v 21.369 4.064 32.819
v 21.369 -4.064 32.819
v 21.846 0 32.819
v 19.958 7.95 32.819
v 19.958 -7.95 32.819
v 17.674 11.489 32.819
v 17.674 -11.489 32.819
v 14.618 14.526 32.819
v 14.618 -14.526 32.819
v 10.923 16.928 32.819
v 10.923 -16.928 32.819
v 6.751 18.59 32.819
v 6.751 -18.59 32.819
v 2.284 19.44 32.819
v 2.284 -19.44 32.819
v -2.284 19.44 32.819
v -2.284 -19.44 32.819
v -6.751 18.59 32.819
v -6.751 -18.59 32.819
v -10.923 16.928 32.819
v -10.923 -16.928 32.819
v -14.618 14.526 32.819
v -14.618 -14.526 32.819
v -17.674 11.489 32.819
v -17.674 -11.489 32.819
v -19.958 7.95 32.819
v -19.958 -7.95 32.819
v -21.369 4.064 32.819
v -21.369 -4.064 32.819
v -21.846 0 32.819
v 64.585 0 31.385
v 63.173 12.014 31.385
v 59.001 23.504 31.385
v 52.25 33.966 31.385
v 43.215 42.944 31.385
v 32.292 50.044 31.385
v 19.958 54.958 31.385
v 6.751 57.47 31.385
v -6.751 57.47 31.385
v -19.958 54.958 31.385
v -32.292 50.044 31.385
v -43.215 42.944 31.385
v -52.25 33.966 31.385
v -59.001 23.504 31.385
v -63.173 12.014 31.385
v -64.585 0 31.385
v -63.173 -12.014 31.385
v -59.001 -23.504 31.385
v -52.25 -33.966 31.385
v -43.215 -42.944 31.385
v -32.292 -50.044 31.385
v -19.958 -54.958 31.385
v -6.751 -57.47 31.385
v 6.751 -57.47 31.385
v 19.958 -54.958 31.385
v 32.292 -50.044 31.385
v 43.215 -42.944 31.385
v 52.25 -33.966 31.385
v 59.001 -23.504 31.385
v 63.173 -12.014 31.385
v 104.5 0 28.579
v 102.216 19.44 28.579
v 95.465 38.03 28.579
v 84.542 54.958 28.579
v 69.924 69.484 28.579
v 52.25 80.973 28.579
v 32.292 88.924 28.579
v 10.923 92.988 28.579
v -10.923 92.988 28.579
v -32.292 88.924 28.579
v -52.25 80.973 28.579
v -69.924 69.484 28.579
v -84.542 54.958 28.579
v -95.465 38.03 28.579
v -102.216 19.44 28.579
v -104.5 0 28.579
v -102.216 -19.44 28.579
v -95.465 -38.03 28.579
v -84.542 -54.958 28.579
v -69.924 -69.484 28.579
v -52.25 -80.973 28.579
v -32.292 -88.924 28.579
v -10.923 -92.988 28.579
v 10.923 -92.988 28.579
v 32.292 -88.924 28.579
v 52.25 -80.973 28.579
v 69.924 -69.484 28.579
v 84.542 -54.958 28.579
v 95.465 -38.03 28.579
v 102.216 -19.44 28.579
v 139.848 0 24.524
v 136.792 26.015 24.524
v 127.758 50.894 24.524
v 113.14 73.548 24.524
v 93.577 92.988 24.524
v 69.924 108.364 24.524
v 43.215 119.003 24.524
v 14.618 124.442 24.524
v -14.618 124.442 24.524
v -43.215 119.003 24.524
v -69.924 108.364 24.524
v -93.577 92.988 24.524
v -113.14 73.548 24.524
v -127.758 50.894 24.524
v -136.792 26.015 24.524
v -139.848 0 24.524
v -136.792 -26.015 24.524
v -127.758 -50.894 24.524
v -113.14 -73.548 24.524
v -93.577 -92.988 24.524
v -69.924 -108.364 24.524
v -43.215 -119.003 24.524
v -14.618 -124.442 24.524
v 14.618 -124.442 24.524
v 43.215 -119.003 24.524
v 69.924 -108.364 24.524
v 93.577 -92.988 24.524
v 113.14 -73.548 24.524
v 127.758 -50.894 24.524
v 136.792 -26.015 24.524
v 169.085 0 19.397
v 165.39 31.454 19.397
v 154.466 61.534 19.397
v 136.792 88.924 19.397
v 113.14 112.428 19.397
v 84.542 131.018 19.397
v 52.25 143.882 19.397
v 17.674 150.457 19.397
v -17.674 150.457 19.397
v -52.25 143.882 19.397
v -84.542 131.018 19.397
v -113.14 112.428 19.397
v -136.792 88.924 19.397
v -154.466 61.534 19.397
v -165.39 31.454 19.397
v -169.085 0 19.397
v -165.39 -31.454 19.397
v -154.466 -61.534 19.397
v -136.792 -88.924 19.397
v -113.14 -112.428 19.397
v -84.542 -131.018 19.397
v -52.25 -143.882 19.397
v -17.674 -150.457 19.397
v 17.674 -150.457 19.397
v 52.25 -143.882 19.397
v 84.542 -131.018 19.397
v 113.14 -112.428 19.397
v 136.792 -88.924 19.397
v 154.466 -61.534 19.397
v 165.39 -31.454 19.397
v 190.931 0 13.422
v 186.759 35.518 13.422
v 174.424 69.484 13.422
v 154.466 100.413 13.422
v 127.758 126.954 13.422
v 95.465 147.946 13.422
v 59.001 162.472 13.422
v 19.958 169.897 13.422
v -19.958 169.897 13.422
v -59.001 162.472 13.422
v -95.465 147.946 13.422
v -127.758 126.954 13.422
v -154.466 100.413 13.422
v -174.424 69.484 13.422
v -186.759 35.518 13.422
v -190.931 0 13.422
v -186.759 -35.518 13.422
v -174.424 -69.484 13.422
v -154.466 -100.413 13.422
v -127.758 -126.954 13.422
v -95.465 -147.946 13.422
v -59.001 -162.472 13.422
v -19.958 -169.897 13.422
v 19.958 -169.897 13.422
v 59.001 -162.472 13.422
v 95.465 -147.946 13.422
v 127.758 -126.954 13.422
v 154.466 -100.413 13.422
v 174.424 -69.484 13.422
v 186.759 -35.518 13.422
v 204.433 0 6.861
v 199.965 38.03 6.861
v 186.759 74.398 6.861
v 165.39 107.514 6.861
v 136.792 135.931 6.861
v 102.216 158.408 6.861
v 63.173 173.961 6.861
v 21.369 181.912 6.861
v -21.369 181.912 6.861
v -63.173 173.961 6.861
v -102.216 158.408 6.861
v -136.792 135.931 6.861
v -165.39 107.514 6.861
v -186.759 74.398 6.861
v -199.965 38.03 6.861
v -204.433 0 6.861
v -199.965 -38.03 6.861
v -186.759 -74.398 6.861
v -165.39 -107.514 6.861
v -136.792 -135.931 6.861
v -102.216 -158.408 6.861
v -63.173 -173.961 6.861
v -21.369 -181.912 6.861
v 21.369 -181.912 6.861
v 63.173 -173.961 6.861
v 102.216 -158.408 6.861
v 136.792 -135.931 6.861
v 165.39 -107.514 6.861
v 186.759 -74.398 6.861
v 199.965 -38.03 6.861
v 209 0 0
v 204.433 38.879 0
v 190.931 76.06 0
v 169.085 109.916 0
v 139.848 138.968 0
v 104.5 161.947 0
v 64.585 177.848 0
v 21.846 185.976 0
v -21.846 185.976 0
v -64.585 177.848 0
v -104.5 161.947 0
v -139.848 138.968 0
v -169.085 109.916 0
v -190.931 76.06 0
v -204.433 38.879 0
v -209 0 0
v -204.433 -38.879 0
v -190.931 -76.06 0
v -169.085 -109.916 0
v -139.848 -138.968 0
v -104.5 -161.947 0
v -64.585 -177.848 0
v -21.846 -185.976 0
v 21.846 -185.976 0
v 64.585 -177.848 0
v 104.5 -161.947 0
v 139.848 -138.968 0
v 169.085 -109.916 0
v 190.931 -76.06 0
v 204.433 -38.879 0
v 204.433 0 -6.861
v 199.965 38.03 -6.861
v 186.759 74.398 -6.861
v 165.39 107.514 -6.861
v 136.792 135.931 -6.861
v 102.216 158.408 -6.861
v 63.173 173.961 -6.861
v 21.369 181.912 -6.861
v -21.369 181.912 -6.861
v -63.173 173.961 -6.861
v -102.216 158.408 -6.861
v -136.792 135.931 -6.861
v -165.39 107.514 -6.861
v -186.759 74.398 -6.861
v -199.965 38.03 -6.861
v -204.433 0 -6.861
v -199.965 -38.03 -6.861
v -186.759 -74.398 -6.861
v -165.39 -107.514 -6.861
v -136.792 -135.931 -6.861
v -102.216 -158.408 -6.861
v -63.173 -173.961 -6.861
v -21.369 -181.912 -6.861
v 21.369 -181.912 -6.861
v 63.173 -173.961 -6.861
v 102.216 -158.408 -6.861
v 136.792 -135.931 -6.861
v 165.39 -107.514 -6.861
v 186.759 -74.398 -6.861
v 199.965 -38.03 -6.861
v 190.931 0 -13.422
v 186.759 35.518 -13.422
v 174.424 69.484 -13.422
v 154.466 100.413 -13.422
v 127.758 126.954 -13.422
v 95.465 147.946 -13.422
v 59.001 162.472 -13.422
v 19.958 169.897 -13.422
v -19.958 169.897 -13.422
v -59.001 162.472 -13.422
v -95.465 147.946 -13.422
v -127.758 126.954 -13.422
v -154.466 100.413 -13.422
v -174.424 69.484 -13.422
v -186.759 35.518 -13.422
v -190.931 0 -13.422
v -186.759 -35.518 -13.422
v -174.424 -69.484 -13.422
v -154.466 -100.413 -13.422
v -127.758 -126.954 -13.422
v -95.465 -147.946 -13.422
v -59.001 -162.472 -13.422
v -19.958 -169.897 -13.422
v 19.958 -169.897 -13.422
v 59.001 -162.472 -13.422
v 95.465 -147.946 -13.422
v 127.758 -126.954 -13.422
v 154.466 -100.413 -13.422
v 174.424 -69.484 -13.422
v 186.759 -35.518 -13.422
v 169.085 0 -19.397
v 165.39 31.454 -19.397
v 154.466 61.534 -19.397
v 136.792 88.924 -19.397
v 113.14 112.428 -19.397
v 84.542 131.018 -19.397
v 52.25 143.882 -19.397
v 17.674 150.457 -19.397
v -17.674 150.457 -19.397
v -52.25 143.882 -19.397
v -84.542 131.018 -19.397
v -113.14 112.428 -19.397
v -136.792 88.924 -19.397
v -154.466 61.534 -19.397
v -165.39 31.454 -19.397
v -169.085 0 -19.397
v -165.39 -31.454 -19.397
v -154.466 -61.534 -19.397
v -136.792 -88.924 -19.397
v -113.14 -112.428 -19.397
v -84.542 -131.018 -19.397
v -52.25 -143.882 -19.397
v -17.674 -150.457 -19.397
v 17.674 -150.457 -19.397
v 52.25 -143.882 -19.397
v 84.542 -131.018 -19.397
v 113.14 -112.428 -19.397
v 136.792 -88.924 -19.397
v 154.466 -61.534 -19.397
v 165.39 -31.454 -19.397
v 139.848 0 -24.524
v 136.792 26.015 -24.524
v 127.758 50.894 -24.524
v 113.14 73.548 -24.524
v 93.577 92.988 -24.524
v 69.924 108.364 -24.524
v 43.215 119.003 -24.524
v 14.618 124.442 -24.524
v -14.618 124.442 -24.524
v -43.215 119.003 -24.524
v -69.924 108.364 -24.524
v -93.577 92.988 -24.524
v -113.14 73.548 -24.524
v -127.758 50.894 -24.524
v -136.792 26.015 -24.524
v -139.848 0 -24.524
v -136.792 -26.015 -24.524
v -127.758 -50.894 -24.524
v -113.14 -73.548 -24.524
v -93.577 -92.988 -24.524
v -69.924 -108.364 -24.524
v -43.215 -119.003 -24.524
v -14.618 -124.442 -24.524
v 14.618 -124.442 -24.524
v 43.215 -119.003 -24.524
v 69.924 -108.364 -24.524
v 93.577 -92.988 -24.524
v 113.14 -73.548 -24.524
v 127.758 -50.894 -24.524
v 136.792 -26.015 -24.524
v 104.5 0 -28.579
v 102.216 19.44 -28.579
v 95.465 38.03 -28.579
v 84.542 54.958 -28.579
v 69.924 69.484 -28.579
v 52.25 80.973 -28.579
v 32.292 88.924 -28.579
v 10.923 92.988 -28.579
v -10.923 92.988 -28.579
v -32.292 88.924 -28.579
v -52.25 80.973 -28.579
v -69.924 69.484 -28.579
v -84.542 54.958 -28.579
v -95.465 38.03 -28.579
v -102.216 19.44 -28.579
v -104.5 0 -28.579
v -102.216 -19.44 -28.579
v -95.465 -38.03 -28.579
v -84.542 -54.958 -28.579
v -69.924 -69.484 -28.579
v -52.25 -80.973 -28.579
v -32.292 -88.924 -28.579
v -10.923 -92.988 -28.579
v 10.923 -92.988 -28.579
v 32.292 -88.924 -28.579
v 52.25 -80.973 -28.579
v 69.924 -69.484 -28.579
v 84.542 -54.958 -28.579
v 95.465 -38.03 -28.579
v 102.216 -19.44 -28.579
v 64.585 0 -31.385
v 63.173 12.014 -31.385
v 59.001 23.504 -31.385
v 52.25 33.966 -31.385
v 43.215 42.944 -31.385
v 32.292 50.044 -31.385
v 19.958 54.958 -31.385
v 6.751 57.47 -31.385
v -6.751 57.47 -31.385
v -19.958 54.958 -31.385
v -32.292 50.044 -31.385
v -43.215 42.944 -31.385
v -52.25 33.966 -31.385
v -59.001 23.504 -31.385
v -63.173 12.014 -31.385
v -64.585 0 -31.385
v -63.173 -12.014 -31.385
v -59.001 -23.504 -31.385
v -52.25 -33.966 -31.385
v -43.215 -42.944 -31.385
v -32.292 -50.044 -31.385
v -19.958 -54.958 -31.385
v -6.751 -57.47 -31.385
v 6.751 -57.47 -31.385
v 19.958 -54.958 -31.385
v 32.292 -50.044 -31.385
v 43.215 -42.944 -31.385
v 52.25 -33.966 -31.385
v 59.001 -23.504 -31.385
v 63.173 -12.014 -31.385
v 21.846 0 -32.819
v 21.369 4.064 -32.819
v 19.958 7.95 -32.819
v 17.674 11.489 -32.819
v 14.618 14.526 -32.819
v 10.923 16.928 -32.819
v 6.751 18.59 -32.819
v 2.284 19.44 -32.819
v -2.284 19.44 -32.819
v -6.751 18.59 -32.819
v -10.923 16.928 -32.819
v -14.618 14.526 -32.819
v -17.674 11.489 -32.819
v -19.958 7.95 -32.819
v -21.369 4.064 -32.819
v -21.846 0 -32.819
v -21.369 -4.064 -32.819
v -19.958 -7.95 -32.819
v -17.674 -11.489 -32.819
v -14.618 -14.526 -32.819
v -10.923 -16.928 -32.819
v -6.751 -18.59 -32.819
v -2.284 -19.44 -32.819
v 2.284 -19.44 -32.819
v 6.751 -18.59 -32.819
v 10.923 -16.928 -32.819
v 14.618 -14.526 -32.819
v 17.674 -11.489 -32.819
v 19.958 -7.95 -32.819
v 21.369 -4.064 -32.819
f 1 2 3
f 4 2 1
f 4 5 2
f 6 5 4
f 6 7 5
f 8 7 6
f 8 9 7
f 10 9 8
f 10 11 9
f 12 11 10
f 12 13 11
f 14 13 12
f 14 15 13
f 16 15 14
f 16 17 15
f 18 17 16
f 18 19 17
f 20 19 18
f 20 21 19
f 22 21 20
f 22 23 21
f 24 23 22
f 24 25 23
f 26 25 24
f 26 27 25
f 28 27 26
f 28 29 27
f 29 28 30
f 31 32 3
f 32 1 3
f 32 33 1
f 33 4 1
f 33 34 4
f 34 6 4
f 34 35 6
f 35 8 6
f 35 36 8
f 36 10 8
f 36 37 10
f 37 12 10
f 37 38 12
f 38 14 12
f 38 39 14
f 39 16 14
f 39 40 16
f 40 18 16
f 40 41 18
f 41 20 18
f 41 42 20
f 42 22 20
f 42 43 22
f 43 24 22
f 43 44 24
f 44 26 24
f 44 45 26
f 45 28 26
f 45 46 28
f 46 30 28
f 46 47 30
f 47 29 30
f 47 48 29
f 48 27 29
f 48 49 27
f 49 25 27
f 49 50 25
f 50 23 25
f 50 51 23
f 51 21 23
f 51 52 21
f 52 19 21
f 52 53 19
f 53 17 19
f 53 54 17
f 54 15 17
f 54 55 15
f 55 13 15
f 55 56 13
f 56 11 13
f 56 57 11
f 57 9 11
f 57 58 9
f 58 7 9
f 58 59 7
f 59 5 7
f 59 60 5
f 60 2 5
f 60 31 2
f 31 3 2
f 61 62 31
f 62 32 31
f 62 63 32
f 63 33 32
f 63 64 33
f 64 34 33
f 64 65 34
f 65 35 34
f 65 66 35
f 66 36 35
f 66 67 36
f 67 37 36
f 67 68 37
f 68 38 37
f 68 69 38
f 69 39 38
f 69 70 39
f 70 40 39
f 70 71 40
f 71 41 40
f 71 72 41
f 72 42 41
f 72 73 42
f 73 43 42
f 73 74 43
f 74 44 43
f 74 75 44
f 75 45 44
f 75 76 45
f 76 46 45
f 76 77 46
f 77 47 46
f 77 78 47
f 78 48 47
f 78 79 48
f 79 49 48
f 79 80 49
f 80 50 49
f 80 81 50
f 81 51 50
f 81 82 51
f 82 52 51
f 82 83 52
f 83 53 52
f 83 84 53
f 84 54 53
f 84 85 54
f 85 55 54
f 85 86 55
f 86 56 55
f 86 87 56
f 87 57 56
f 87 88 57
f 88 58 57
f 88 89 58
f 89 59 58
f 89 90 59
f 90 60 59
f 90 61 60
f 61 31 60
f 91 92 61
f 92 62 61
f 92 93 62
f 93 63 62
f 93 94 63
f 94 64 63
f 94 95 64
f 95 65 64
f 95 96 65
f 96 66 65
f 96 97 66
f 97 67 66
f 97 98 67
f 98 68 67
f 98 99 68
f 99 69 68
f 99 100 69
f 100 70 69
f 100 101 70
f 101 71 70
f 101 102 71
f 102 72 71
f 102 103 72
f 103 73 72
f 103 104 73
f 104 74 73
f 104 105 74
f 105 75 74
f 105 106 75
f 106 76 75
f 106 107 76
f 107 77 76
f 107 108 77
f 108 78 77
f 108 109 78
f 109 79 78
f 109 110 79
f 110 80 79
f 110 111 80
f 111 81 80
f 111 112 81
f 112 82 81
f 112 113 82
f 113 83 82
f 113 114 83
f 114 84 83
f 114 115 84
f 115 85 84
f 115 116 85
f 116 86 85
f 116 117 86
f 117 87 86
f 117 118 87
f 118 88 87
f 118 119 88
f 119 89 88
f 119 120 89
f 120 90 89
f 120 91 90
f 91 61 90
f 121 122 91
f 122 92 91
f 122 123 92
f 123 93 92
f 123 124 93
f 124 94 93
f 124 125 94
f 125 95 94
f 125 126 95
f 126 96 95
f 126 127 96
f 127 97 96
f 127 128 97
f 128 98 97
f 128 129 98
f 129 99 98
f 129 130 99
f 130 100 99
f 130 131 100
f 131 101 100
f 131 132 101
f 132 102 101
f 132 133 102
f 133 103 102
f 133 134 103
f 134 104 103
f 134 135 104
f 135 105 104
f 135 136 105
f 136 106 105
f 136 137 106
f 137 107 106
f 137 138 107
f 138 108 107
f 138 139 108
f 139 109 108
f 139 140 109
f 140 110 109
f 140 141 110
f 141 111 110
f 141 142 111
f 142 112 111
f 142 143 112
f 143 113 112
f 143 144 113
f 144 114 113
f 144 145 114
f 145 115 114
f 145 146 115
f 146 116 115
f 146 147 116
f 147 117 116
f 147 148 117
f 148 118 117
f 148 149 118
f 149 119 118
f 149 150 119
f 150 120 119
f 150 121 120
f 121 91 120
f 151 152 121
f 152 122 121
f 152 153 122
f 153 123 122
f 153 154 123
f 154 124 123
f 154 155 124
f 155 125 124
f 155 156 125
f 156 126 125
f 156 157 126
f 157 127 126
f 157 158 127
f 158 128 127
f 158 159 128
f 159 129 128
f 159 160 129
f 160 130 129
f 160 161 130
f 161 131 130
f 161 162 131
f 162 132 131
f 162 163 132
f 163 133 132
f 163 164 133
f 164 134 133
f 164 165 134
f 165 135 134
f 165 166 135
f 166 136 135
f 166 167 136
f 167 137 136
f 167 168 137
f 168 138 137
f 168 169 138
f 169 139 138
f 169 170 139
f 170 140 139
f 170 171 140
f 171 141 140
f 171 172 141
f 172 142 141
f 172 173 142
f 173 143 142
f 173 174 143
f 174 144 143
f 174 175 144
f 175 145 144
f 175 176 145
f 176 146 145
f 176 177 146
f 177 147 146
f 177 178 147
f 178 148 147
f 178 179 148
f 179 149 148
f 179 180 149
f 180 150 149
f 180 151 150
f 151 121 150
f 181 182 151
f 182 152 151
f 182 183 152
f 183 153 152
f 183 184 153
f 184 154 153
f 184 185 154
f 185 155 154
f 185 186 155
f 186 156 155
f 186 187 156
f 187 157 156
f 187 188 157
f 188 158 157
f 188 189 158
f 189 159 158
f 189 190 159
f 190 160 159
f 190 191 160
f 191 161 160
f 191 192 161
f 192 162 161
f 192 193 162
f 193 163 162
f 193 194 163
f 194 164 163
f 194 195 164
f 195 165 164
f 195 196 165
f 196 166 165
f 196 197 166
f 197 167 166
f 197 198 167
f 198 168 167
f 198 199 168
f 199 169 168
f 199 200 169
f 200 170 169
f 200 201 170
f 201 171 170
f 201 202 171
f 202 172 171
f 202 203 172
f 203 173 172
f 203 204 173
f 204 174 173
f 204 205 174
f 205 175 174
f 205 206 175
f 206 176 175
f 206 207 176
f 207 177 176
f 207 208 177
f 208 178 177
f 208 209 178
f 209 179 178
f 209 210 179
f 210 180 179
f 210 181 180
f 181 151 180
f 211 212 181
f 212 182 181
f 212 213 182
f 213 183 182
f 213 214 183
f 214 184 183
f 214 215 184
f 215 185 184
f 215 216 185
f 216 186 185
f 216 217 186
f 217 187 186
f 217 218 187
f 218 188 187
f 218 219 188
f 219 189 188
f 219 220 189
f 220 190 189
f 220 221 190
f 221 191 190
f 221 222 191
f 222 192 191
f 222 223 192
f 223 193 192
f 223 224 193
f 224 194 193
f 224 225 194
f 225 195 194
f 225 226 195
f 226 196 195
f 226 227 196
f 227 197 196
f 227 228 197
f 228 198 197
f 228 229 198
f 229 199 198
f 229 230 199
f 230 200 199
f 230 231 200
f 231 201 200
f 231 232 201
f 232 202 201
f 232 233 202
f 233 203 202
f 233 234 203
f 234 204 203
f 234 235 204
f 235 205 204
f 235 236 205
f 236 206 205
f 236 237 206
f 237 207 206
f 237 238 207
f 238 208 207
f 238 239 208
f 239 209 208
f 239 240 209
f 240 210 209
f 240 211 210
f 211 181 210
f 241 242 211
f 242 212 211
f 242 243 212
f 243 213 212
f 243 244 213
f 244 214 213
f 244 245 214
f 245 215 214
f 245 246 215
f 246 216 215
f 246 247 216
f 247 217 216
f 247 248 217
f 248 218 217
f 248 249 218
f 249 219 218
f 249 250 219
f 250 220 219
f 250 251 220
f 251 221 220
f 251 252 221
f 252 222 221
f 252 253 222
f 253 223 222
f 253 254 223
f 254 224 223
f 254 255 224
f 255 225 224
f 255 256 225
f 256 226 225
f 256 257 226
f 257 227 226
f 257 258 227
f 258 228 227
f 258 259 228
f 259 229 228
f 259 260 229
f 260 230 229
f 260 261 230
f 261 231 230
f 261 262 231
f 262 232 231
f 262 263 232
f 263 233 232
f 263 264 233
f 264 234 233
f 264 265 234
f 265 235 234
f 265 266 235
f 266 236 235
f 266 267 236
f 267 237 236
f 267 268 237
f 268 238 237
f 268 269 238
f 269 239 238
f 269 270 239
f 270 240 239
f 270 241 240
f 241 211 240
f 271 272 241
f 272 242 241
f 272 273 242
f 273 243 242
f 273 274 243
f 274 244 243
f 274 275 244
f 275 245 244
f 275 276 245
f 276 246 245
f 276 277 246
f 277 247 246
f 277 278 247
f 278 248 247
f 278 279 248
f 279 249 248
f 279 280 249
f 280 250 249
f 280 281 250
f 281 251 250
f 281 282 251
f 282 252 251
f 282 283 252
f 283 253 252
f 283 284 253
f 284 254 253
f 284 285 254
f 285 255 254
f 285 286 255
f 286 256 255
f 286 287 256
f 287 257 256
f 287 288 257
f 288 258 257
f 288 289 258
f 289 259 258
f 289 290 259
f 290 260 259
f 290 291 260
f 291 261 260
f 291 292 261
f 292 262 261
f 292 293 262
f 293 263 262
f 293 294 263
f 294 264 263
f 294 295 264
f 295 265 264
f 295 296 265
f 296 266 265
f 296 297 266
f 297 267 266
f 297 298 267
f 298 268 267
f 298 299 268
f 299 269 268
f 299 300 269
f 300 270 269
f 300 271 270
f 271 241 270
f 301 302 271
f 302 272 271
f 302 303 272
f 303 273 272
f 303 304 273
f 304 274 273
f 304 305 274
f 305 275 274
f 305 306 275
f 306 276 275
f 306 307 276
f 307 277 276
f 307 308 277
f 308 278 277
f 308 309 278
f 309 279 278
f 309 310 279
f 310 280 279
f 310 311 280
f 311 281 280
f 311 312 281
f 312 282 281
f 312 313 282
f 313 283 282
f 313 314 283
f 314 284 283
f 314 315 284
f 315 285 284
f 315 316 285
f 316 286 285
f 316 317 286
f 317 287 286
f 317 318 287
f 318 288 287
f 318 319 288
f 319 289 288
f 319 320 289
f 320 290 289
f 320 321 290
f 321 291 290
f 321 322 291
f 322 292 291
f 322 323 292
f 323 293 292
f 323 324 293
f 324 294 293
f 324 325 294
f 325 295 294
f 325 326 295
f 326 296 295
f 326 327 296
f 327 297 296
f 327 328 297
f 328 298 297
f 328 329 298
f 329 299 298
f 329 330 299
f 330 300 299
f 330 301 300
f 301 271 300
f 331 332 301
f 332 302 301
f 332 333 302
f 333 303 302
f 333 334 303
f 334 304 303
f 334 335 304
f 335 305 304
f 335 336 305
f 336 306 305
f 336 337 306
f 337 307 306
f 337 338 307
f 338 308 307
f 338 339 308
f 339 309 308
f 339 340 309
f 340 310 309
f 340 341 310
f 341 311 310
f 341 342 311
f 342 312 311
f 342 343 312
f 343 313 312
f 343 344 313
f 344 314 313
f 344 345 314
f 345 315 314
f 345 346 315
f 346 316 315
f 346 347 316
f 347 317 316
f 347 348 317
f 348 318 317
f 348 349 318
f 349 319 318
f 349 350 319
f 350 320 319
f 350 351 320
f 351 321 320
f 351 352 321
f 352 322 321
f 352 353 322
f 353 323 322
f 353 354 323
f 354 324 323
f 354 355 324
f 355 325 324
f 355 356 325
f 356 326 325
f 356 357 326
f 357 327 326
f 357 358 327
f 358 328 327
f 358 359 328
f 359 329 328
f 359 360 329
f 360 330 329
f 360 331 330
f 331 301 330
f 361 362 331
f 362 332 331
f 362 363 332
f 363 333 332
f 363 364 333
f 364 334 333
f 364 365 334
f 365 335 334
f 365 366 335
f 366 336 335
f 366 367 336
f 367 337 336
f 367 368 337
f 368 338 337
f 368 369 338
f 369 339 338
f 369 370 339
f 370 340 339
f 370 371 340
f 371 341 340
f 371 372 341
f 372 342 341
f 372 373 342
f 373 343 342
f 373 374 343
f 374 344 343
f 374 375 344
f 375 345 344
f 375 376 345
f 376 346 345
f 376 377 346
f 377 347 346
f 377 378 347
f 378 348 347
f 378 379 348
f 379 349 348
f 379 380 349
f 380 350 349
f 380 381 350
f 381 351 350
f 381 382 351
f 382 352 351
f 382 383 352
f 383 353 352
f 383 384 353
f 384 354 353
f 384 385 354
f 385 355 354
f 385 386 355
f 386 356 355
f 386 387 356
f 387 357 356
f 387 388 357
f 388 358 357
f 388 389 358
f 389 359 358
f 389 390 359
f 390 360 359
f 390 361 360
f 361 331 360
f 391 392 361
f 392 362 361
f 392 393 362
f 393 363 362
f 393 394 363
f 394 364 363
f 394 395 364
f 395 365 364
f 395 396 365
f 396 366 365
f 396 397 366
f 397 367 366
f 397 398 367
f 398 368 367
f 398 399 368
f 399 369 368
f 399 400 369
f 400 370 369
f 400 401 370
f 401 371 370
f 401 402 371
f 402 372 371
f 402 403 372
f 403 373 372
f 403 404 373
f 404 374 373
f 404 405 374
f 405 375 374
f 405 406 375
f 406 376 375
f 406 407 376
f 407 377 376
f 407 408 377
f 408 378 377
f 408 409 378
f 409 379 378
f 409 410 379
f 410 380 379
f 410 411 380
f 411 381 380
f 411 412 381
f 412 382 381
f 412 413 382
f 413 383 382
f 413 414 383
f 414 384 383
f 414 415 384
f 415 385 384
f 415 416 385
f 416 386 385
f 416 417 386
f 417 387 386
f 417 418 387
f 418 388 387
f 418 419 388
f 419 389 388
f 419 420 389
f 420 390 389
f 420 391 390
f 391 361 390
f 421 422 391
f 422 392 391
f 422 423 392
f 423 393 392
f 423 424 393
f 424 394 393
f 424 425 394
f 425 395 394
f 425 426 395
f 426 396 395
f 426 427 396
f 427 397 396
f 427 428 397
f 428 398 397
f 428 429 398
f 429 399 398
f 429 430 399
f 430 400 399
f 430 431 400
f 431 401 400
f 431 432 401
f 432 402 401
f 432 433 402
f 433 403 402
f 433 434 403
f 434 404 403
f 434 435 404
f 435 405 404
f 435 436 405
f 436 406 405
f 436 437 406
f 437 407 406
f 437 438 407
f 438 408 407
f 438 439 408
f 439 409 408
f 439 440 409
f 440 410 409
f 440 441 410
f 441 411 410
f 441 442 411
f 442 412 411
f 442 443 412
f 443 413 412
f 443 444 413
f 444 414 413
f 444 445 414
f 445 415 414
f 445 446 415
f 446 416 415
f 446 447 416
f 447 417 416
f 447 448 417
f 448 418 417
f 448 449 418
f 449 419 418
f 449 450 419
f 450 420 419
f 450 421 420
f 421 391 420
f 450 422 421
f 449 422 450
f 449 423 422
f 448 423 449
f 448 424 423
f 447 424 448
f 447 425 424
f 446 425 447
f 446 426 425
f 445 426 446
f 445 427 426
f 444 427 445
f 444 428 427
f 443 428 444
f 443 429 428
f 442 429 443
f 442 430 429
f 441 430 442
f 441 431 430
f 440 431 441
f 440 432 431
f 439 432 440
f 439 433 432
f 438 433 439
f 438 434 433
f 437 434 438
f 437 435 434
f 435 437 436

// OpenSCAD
// Generated by SolidPython 1.0.1 on 2020-07-29 00:46:54


scale(v = [19, 17, 3]) {
	sphere(r = 11);
}
/***********************************************
*********      SolidPython code:      **********
************************************************
 
# import packages: SolidPython
from solid import *
from solid.utils import *
from itertools import chain, combinations, permutations


class Resize:

    def __init__(self, scad_file):
        self.scad_file = scad_file
        #self.scad_file = import_scad(scad_file)
        # cone/cylinder param:
        self.r1 = 0
        self.r2 = 0
        self.h = 0
        # rectangular prism param:
        self.w = 0
        self.l = 0
        # ellipse param:
        self.r = 0

    # import OpenScad code (file name corresponds to shape)


    # classify shape + parameters
    def assign(self, param1, param2, param3):
        if self.scad_file == 'cone.scad':
            self.r1 = param1
            self.r2 = param2
            self.h = param3
        elif self.scad_file == 'cylinder.scad':
            self.r1 = param1
            self.r2 = param2
            self.h = param3
        elif self.scad_file == 'rectangularPrism.scad':
            self.h = param1
            self.l = param2
            self.w = param3
        else:
            self.r = param1
            self.h = param2

    # resize parameters
    def iterate(self):
        x = range(3, 20, 2)
        i = 1
        if self.scad_file == 'cone.scad':
            tempList = list(permutations(x, 2))
            for temp in tempList:
                param1 = temp[0]
                param2 = temp[1]
                filepath = 'produced_scad_files/' + 'cone' + str(param1) + '_' + str(param2) + '_' + '.scad'
                scad_render_to_file(cylinder(h=param1, r1=param2, r2=0), filepath)

        elif self.scad_file == 'cylinder.scad':
            tempList = list(permutations(x, 3))
            for temp in tempList:
                param1 = temp[0]
                param2 = temp[1]
                filepath = 'produced_scad_files/' + 'cylinder' + str(param1) + '_' + str(param2) + '_' + '.scad'
                scad_render_to_file(cylinder(h=param1, r1=param2, r2=param2), filepath)

        elif self.scad_file == 'rectangularPrism.scad':
            tempList = list(permutations(x, 3))
            for temp in tempList:
                param1 = temp[0]
                param2 = temp[1]
                param3 = temp[2]
                filepath = 'produced_scad_files/' + 'rectangularPrism' + str(param1) + '_' + str(param2) + '_' + str(
                    param3) + '.scad'
                scad_render_to_file(cube(size=(param1, param2, param3)), filepath)

        elif self.scad_file == 'ellipse.scad':
            tempList = list(permutations(x, 4))
            for temp in tempList:
                param1 = temp[0]
                param2 = temp[1]
                param3 = temp[2]
                param4 = temp[3]
                filepath = 'produced_scad_files/' + 'ellipse' + str(param1) + '_' + str(param2) + '_' + str(param3) + '_' + str(param4) + '.scad'
                scad_render_to_file(scale([param1, param2, param3])(sphere(r=param4)), filepath)

    def render_to_scadfile(self):
        scad_render_to_file(scad, 'example.scad') 
 
************************************************/
